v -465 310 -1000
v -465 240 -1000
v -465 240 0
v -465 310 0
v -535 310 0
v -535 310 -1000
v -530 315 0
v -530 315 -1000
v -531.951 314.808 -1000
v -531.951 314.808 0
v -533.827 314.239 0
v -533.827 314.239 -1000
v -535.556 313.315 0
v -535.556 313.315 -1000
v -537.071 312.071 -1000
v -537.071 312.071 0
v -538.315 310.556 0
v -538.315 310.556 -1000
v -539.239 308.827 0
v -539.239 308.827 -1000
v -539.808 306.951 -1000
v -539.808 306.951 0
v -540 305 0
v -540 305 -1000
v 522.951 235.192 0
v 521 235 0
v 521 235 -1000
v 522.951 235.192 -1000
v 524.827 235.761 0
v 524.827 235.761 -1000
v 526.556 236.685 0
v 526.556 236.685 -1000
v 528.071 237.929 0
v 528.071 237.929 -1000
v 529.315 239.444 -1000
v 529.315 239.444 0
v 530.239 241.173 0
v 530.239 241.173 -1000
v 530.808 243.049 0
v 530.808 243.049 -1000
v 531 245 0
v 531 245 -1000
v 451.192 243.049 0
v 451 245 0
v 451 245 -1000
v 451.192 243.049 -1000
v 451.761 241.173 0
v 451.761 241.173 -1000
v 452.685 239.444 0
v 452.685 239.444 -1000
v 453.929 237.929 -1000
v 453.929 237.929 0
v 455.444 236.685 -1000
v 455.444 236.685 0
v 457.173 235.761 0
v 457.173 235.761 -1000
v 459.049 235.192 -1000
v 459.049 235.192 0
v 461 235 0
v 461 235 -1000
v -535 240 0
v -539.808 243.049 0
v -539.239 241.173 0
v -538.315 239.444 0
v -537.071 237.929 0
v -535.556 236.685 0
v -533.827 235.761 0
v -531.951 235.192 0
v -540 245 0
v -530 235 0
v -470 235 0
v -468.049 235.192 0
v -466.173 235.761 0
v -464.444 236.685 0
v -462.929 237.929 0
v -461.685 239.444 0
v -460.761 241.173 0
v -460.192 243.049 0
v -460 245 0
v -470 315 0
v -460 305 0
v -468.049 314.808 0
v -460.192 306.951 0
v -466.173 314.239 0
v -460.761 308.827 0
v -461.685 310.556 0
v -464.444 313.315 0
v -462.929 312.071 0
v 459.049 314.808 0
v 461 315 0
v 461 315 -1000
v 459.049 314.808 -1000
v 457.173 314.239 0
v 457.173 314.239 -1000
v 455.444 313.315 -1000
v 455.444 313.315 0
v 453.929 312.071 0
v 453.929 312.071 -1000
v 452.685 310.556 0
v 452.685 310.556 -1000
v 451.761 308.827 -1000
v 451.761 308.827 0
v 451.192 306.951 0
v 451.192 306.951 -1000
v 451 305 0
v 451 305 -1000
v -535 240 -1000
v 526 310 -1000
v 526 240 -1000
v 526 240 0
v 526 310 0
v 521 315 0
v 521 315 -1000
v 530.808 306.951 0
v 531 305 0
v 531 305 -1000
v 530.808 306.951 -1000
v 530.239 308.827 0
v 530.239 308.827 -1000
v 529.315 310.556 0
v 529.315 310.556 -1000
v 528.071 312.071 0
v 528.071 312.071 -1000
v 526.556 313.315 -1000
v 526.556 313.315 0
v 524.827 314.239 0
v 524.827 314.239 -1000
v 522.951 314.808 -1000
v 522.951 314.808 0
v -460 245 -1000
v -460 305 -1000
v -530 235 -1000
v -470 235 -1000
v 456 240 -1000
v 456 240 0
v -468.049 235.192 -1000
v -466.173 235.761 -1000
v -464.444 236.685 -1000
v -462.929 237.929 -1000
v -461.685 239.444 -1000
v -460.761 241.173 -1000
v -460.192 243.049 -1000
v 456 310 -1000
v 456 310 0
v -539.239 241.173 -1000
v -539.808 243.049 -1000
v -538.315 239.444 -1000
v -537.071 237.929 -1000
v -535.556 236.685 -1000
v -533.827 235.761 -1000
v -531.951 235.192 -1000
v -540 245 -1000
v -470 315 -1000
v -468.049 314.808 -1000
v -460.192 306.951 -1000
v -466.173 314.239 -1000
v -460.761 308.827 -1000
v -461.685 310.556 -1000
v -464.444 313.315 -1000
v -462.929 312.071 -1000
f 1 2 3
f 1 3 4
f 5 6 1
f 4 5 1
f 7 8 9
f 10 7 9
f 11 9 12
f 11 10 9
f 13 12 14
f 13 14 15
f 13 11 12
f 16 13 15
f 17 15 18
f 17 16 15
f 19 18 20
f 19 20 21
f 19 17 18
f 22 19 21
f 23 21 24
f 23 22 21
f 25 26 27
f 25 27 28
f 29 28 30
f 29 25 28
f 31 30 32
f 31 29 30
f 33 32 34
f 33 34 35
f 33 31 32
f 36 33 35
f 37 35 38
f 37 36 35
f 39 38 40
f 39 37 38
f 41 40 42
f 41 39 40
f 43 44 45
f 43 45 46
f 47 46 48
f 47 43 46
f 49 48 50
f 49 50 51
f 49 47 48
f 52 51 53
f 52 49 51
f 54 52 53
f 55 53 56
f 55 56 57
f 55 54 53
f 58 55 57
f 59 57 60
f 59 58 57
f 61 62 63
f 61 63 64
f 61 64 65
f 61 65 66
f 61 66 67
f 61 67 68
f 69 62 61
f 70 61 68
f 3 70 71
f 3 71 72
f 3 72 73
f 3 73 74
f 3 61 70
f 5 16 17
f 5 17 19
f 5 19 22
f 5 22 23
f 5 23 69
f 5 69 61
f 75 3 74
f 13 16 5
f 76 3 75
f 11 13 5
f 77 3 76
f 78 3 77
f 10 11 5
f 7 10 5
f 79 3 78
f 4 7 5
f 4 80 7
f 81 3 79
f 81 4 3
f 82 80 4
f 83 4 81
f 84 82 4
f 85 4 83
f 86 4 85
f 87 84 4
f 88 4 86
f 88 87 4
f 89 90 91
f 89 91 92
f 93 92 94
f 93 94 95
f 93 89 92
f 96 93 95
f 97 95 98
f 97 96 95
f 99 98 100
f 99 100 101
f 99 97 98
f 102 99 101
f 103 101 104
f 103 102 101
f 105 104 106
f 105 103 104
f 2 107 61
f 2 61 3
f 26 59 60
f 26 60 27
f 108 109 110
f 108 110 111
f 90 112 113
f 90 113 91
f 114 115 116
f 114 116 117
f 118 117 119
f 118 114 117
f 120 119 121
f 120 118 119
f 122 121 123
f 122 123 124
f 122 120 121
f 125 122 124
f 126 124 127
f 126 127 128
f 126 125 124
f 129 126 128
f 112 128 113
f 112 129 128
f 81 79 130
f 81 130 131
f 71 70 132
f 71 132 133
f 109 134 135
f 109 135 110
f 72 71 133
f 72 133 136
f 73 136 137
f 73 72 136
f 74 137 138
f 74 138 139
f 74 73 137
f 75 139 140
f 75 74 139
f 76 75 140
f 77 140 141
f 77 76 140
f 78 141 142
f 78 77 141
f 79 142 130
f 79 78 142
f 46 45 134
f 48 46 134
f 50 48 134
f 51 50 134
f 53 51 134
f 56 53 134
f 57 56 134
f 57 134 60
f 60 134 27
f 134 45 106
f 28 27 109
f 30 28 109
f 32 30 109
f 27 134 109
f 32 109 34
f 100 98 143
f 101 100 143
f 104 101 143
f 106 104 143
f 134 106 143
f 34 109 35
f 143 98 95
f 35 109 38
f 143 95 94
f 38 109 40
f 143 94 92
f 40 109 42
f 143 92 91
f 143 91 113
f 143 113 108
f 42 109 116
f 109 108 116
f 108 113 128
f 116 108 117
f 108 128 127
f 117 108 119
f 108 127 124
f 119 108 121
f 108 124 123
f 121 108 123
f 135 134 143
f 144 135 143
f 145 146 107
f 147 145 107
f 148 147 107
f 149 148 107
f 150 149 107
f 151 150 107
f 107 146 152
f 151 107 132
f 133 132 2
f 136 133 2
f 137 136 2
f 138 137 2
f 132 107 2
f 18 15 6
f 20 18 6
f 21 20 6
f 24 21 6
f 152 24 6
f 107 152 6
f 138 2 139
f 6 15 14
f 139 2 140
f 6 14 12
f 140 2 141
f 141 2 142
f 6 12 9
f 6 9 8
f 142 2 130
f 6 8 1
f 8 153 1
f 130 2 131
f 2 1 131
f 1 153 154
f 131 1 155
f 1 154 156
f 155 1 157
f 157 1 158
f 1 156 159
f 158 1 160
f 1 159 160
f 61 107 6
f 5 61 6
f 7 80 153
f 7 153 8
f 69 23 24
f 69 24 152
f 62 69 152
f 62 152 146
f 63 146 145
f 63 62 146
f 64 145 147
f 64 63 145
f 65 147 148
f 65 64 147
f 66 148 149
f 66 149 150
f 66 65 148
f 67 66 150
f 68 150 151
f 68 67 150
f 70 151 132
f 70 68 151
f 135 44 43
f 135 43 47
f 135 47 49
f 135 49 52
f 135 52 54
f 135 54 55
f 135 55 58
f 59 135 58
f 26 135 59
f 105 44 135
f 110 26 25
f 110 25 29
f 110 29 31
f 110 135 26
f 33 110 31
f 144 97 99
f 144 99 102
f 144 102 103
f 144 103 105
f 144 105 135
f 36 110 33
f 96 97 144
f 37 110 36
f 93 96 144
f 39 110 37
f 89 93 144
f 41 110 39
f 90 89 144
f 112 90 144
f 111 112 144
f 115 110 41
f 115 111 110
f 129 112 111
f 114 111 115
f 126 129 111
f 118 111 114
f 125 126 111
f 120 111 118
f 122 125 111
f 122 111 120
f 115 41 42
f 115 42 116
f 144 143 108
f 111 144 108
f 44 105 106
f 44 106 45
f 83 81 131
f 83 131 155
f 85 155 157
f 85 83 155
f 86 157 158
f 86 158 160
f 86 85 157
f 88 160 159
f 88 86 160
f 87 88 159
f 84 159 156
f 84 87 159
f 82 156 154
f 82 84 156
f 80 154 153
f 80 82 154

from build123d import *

# Parameters (mm, degrees)
F0_W     = 70
F0_H     = 70
F1_DEPTH = 1000


with BuildPart() as f1:
    # F0 (on Top) → F1 (new body)
    with BuildSketch(Plane.XY):
        with BuildLine():
            Line((-470, 315), (-530, 315))
            ThreePointArc((-530, 315), (-537.071068, 312.071068), (-540, 305))
            Line((-540, 305), (-540, 245))
            ThreePointArc((-540, 245), (-537.071068, 237.928932), (-530, 235))
            Line((-530, 235), (-470, 235))
            ThreePointArc((-470, 235), (-462.928932, 237.928932), (-460, 245))
            Line((-460, 245), (-460, 305))
            ThreePointArc((-460, 305), (-462.928932, 312.071068), (-470, 315))
        make_face()
        with Locations((-500, 275)):
            Rectangle(F0_W, F0_H, mode=Mode.SUBTRACT)
        with BuildLine():
            Line((520.999975, 314.999999), (460.999975, 314.999999))
            ThreePointArc((460.999975, 314.999999), (453.928907, 312.071067), (450.999975, 304.999999))
            Line((450.999975, 304.999999), (450.999975, 244.999999))
            ThreePointArc((450.999975, 244.999999), (453.928907, 237.928932), (460.999975, 234.999999))
            Line((460.999975, 234.999999), (520.999975, 234.999999))
            ThreePointArc((520.999975, 234.999999), (528.071043, 237.928932), (530.999975, 244.999999))
            Line((530.999975, 244.999999), (530.999975, 304.999999))
            ThreePointArc((530.999975, 304.999999), (528.071043, 312.071067), (520.999975, 314.999999))
        make_face()
        with Locations((490.999975, 274.999999)):
            Rectangle(F0_W, F0_H, mode=Mode.SUBTRACT)
    extrude(amount=-F1_DEPTH)


solid = f1.part
